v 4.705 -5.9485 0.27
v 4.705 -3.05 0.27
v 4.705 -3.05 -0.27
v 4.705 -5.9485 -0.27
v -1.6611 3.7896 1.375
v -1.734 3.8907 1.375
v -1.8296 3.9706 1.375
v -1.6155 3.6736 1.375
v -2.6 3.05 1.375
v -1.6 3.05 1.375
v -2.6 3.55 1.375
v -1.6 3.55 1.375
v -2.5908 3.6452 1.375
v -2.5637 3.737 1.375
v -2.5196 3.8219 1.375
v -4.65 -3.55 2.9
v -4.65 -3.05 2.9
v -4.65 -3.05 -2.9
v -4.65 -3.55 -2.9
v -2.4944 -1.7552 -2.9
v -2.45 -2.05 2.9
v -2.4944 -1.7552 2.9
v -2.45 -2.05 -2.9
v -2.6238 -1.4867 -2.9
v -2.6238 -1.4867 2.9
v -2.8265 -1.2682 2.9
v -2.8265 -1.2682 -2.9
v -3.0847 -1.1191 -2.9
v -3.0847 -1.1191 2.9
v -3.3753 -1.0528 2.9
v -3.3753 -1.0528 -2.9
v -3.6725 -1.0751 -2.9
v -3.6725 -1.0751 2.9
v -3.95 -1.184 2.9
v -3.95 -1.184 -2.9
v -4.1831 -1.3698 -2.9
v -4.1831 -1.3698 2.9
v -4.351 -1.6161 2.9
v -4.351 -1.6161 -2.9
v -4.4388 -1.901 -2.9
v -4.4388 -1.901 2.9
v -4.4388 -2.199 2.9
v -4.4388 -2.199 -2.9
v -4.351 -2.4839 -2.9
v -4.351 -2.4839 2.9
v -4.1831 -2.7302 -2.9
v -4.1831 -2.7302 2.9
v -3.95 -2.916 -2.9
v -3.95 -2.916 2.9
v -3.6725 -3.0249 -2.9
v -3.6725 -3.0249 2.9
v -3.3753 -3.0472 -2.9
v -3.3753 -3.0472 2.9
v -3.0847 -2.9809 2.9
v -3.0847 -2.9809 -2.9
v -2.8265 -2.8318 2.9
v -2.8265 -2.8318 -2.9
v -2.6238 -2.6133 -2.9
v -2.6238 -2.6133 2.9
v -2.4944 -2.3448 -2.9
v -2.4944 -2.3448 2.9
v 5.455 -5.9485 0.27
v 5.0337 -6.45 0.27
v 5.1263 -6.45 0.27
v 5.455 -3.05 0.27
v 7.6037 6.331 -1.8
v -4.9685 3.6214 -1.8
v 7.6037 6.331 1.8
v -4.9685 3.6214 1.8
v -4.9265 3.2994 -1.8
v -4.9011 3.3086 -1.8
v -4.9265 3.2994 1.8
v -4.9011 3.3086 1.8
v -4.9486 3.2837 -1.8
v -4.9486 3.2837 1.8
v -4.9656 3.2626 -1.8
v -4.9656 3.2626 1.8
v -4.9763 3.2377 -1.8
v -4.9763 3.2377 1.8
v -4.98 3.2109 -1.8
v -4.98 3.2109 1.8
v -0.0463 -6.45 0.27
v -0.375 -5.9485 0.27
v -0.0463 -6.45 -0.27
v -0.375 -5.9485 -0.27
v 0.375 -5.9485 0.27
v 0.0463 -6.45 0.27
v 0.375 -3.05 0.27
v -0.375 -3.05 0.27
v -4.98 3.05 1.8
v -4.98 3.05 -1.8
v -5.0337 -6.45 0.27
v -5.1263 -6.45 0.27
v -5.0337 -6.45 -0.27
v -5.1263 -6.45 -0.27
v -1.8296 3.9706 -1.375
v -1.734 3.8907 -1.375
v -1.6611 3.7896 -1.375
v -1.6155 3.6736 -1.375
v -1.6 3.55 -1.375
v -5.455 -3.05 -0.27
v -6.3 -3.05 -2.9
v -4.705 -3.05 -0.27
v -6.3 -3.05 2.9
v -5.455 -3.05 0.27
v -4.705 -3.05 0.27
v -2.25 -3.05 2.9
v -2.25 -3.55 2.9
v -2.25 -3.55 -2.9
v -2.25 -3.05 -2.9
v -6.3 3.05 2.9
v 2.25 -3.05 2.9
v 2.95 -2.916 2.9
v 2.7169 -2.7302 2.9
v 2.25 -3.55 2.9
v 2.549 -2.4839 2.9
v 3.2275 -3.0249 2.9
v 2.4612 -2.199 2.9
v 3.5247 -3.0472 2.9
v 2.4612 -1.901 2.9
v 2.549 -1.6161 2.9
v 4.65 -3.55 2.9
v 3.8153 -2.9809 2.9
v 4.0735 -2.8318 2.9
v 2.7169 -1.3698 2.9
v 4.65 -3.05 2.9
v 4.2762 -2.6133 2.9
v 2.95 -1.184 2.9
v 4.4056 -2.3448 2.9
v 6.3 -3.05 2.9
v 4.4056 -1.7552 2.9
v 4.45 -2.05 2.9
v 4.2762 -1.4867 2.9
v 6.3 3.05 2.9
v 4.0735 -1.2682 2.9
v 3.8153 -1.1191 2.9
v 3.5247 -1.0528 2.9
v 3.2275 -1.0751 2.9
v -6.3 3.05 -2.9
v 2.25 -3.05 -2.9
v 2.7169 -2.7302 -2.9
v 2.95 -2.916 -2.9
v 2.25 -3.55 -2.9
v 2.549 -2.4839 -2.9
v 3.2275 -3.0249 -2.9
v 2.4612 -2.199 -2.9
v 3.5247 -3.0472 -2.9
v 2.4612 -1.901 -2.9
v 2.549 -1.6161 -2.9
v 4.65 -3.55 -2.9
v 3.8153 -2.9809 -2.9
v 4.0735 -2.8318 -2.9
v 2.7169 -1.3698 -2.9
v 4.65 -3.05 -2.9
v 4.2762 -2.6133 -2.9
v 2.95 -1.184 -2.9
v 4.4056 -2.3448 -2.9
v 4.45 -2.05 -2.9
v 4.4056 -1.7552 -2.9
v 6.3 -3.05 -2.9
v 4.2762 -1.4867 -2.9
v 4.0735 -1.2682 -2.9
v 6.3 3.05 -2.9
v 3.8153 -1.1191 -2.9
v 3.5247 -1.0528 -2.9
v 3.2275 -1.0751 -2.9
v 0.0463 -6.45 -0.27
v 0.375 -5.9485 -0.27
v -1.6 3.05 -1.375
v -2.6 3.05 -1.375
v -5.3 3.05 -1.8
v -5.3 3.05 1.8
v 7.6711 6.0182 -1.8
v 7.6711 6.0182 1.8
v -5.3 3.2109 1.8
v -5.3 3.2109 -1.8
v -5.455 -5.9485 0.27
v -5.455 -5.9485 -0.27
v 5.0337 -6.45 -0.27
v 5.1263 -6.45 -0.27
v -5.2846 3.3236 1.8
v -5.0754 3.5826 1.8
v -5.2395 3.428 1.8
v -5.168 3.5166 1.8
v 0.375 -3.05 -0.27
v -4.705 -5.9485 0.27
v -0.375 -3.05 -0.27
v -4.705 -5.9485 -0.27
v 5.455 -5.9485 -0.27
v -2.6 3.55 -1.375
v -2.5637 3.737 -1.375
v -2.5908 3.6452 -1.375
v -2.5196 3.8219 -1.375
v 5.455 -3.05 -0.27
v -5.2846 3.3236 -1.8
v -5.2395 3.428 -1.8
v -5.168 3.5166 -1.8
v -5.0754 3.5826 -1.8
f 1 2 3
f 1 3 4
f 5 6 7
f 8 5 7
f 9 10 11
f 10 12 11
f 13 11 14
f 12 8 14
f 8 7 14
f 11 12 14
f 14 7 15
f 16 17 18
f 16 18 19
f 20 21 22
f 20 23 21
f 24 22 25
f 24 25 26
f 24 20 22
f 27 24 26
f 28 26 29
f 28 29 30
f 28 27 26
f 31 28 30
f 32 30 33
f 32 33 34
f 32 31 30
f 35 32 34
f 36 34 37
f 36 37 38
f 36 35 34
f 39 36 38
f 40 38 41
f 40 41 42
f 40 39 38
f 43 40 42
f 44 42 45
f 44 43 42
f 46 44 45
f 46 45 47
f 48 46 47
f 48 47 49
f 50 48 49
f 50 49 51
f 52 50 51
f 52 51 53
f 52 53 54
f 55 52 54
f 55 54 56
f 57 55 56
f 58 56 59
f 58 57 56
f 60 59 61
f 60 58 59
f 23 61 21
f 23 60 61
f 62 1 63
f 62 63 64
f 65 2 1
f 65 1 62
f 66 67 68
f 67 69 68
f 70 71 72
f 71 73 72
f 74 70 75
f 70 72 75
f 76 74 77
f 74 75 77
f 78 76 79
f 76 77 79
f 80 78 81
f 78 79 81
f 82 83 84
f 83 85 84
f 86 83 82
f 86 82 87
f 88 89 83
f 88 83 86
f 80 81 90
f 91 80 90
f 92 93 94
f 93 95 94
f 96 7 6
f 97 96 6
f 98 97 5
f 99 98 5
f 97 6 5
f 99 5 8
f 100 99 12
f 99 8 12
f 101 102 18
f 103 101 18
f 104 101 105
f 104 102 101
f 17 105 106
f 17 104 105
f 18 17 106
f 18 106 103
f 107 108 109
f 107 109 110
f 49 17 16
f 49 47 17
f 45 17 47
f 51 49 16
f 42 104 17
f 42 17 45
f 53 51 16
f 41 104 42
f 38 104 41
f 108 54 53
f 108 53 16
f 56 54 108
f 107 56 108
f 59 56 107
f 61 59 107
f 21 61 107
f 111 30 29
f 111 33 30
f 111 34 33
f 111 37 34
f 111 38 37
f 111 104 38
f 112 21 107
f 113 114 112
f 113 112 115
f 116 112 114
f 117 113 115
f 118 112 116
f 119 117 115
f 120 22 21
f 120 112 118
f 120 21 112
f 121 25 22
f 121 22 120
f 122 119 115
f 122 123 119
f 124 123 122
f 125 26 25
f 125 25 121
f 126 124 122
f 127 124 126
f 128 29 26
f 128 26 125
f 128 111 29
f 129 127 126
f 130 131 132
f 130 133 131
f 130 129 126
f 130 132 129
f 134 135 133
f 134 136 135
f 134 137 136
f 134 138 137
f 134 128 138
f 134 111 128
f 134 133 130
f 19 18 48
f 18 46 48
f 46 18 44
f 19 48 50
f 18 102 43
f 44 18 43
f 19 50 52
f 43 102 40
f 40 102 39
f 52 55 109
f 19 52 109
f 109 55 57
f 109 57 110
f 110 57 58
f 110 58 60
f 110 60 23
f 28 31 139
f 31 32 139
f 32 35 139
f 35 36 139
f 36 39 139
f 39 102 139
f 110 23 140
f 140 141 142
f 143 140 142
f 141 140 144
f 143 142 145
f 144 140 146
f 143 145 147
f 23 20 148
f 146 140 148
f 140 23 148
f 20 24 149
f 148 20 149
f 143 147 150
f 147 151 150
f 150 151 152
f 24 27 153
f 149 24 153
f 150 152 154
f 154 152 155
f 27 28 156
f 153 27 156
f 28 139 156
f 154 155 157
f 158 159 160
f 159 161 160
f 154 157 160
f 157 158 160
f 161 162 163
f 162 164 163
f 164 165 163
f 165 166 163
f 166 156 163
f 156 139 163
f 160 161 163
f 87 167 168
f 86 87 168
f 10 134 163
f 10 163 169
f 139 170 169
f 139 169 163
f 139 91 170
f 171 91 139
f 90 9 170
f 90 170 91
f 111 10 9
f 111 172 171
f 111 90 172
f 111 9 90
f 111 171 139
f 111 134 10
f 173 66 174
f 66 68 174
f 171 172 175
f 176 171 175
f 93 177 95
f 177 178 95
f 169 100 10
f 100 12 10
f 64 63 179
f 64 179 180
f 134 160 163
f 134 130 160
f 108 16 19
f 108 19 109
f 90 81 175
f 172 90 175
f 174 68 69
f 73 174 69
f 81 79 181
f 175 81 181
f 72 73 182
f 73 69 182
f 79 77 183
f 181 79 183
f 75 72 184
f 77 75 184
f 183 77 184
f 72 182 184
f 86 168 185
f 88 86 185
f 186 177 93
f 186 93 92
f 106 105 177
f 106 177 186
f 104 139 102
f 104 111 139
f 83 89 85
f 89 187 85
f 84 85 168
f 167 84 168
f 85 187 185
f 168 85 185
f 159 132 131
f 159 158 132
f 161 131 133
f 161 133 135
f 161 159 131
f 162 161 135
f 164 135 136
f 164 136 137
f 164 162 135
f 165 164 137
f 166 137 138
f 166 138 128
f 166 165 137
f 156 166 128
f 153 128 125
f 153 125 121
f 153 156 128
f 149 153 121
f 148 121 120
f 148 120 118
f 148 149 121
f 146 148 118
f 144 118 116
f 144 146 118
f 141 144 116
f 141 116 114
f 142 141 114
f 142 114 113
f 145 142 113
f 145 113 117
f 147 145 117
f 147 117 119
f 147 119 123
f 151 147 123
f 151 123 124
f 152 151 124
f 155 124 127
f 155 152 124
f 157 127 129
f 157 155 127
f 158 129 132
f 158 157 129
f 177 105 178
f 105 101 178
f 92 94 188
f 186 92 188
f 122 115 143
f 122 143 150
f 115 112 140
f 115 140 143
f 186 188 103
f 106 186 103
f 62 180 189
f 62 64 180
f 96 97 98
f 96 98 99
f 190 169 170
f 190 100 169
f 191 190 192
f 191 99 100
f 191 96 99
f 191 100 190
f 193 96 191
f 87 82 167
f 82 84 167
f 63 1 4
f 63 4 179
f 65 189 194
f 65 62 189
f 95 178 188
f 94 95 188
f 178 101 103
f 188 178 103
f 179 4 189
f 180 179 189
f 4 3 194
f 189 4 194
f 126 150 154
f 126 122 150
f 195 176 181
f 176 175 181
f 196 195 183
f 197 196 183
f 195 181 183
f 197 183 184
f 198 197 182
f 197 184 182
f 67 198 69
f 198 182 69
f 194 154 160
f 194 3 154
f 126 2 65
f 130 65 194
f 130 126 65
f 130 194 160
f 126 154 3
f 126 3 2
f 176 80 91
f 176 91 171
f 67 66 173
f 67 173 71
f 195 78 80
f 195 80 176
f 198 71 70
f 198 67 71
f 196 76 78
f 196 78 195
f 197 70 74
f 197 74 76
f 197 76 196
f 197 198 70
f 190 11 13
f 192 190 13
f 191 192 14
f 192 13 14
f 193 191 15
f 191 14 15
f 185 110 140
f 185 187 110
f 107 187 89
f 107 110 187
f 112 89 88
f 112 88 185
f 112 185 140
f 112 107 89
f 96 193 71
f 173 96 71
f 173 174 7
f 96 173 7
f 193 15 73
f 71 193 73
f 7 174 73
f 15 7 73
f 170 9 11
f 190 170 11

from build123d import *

# Parameters (mm, degrees)
SKETCH2_R           = 1
BODY_DEPTH          = 2.9
LEVER_DEPTH         = 1.8
LEGS_DEPTH          = 0.27
BOSS_EXTRUDE3_DEPTH = 1.375


# Sheet-metal steps are written as plain solids
with BuildPart() as part:
    # Sketch2 → Body (new, symmetric)
    with BuildSketch(Plane.XY):
        Polygon((-6.3, -3.05), (-4.65, -3.05), (-4.65, -3.55), (-2.25, -3.55), (-2.25, -3.05), (2.25, -3.05), (2.25, -3.55), (4.65, -3.55), (4.65, -3.05), (6.3, -3.05), (6.3, 3.05), (-6.3, 3.05), align=None)
        with Locations((-3.45, -2.05)):
            Circle(SKETCH2_R, mode=Mode.SUBTRACT)
        with Locations((3.45, -2.05)):
            Circle(SKETCH2_R, mode=Mode.SUBTRACT)
    extrude(amount=BODY_DEPTH, both=True)

    # Sketch8 → Legs (add, symmetric)
    with BuildSketch(Plane.XY):
        Polygon((-4.705, -3.05), (-5.455, -3.05), (-5.455, -5.94846389), (-5.126348987, -6.45), (-5.033651013, -6.45), (-4.705, -5.94846389), align=None)
        Polygon((0.375, -3.05), (-0.375, -3.05), (-0.375, -5.94846389), (-0.046348987, -6.45), (0.046348987, -6.45), (0.375, -5.94846389), align=None)
        Polygon((5.455, -3.05), (4.705, -3.05), (4.705, -5.94846389), (5.033651013, -6.45), (5.126348987, -6.45), (5.455, -5.94846389), align=None)
    extrude(amount=LEGS_DEPTH, both=True)



with BuildPart() as body_2:
    # Sketch3 → Lever (new, symmetric)
    with BuildSketch(Plane.XY):
        with BuildLine():
            Line((-5.3, 3.05), (-5.3, 3.210873935))
            ThreePointArc((-5.3, 3.210873935), (-5.206775112, 3.474726216), (-4.96848559, 3.621447071))
            Line((-4.96848559, 3.621447071), (7.603727147, 6.330975678))
            Line((7.603727147, 6.330975678), (7.671144739, 6.01815805))
            Line((7.671144739, 6.01815805), (-4.901067998, 3.308629443))
            ThreePointArc((-4.901067998, 3.308629443), (-4.957803598, 3.273695906), (-4.98, 3.210873935))
            Line((-4.98, 3.210873935), (-4.98, 3.05))
            Line((-4.98, 3.05), (-5.3, 3.05))
        make_face()
    extrude(amount=LEVER_DEPTH, both=True)


with BuildPart() as part_1:
    add(part.part)

    add(body_2.part)  # Boss-Extrude3 merges body 2
    # Sketch9 → Boss-Extrude3 (add, symmetric)
    with BuildSketch(Plane.XY):
        with BuildLine():
            Line((-2.6, 3.05), (-2.6, 3.55))
            ThreePointArc((-2.6, 3.55), (-2.1, 4.05), (-1.6, 3.55))
            Line((-1.6, 3.55), (-1.6, 3.05))
            Line((-1.6, 3.05), (-2.6, 3.05))
        make_face()
    extrude(amount=BOSS_EXTRUDE3_DEPTH, both=True)


solid = part_1.part
